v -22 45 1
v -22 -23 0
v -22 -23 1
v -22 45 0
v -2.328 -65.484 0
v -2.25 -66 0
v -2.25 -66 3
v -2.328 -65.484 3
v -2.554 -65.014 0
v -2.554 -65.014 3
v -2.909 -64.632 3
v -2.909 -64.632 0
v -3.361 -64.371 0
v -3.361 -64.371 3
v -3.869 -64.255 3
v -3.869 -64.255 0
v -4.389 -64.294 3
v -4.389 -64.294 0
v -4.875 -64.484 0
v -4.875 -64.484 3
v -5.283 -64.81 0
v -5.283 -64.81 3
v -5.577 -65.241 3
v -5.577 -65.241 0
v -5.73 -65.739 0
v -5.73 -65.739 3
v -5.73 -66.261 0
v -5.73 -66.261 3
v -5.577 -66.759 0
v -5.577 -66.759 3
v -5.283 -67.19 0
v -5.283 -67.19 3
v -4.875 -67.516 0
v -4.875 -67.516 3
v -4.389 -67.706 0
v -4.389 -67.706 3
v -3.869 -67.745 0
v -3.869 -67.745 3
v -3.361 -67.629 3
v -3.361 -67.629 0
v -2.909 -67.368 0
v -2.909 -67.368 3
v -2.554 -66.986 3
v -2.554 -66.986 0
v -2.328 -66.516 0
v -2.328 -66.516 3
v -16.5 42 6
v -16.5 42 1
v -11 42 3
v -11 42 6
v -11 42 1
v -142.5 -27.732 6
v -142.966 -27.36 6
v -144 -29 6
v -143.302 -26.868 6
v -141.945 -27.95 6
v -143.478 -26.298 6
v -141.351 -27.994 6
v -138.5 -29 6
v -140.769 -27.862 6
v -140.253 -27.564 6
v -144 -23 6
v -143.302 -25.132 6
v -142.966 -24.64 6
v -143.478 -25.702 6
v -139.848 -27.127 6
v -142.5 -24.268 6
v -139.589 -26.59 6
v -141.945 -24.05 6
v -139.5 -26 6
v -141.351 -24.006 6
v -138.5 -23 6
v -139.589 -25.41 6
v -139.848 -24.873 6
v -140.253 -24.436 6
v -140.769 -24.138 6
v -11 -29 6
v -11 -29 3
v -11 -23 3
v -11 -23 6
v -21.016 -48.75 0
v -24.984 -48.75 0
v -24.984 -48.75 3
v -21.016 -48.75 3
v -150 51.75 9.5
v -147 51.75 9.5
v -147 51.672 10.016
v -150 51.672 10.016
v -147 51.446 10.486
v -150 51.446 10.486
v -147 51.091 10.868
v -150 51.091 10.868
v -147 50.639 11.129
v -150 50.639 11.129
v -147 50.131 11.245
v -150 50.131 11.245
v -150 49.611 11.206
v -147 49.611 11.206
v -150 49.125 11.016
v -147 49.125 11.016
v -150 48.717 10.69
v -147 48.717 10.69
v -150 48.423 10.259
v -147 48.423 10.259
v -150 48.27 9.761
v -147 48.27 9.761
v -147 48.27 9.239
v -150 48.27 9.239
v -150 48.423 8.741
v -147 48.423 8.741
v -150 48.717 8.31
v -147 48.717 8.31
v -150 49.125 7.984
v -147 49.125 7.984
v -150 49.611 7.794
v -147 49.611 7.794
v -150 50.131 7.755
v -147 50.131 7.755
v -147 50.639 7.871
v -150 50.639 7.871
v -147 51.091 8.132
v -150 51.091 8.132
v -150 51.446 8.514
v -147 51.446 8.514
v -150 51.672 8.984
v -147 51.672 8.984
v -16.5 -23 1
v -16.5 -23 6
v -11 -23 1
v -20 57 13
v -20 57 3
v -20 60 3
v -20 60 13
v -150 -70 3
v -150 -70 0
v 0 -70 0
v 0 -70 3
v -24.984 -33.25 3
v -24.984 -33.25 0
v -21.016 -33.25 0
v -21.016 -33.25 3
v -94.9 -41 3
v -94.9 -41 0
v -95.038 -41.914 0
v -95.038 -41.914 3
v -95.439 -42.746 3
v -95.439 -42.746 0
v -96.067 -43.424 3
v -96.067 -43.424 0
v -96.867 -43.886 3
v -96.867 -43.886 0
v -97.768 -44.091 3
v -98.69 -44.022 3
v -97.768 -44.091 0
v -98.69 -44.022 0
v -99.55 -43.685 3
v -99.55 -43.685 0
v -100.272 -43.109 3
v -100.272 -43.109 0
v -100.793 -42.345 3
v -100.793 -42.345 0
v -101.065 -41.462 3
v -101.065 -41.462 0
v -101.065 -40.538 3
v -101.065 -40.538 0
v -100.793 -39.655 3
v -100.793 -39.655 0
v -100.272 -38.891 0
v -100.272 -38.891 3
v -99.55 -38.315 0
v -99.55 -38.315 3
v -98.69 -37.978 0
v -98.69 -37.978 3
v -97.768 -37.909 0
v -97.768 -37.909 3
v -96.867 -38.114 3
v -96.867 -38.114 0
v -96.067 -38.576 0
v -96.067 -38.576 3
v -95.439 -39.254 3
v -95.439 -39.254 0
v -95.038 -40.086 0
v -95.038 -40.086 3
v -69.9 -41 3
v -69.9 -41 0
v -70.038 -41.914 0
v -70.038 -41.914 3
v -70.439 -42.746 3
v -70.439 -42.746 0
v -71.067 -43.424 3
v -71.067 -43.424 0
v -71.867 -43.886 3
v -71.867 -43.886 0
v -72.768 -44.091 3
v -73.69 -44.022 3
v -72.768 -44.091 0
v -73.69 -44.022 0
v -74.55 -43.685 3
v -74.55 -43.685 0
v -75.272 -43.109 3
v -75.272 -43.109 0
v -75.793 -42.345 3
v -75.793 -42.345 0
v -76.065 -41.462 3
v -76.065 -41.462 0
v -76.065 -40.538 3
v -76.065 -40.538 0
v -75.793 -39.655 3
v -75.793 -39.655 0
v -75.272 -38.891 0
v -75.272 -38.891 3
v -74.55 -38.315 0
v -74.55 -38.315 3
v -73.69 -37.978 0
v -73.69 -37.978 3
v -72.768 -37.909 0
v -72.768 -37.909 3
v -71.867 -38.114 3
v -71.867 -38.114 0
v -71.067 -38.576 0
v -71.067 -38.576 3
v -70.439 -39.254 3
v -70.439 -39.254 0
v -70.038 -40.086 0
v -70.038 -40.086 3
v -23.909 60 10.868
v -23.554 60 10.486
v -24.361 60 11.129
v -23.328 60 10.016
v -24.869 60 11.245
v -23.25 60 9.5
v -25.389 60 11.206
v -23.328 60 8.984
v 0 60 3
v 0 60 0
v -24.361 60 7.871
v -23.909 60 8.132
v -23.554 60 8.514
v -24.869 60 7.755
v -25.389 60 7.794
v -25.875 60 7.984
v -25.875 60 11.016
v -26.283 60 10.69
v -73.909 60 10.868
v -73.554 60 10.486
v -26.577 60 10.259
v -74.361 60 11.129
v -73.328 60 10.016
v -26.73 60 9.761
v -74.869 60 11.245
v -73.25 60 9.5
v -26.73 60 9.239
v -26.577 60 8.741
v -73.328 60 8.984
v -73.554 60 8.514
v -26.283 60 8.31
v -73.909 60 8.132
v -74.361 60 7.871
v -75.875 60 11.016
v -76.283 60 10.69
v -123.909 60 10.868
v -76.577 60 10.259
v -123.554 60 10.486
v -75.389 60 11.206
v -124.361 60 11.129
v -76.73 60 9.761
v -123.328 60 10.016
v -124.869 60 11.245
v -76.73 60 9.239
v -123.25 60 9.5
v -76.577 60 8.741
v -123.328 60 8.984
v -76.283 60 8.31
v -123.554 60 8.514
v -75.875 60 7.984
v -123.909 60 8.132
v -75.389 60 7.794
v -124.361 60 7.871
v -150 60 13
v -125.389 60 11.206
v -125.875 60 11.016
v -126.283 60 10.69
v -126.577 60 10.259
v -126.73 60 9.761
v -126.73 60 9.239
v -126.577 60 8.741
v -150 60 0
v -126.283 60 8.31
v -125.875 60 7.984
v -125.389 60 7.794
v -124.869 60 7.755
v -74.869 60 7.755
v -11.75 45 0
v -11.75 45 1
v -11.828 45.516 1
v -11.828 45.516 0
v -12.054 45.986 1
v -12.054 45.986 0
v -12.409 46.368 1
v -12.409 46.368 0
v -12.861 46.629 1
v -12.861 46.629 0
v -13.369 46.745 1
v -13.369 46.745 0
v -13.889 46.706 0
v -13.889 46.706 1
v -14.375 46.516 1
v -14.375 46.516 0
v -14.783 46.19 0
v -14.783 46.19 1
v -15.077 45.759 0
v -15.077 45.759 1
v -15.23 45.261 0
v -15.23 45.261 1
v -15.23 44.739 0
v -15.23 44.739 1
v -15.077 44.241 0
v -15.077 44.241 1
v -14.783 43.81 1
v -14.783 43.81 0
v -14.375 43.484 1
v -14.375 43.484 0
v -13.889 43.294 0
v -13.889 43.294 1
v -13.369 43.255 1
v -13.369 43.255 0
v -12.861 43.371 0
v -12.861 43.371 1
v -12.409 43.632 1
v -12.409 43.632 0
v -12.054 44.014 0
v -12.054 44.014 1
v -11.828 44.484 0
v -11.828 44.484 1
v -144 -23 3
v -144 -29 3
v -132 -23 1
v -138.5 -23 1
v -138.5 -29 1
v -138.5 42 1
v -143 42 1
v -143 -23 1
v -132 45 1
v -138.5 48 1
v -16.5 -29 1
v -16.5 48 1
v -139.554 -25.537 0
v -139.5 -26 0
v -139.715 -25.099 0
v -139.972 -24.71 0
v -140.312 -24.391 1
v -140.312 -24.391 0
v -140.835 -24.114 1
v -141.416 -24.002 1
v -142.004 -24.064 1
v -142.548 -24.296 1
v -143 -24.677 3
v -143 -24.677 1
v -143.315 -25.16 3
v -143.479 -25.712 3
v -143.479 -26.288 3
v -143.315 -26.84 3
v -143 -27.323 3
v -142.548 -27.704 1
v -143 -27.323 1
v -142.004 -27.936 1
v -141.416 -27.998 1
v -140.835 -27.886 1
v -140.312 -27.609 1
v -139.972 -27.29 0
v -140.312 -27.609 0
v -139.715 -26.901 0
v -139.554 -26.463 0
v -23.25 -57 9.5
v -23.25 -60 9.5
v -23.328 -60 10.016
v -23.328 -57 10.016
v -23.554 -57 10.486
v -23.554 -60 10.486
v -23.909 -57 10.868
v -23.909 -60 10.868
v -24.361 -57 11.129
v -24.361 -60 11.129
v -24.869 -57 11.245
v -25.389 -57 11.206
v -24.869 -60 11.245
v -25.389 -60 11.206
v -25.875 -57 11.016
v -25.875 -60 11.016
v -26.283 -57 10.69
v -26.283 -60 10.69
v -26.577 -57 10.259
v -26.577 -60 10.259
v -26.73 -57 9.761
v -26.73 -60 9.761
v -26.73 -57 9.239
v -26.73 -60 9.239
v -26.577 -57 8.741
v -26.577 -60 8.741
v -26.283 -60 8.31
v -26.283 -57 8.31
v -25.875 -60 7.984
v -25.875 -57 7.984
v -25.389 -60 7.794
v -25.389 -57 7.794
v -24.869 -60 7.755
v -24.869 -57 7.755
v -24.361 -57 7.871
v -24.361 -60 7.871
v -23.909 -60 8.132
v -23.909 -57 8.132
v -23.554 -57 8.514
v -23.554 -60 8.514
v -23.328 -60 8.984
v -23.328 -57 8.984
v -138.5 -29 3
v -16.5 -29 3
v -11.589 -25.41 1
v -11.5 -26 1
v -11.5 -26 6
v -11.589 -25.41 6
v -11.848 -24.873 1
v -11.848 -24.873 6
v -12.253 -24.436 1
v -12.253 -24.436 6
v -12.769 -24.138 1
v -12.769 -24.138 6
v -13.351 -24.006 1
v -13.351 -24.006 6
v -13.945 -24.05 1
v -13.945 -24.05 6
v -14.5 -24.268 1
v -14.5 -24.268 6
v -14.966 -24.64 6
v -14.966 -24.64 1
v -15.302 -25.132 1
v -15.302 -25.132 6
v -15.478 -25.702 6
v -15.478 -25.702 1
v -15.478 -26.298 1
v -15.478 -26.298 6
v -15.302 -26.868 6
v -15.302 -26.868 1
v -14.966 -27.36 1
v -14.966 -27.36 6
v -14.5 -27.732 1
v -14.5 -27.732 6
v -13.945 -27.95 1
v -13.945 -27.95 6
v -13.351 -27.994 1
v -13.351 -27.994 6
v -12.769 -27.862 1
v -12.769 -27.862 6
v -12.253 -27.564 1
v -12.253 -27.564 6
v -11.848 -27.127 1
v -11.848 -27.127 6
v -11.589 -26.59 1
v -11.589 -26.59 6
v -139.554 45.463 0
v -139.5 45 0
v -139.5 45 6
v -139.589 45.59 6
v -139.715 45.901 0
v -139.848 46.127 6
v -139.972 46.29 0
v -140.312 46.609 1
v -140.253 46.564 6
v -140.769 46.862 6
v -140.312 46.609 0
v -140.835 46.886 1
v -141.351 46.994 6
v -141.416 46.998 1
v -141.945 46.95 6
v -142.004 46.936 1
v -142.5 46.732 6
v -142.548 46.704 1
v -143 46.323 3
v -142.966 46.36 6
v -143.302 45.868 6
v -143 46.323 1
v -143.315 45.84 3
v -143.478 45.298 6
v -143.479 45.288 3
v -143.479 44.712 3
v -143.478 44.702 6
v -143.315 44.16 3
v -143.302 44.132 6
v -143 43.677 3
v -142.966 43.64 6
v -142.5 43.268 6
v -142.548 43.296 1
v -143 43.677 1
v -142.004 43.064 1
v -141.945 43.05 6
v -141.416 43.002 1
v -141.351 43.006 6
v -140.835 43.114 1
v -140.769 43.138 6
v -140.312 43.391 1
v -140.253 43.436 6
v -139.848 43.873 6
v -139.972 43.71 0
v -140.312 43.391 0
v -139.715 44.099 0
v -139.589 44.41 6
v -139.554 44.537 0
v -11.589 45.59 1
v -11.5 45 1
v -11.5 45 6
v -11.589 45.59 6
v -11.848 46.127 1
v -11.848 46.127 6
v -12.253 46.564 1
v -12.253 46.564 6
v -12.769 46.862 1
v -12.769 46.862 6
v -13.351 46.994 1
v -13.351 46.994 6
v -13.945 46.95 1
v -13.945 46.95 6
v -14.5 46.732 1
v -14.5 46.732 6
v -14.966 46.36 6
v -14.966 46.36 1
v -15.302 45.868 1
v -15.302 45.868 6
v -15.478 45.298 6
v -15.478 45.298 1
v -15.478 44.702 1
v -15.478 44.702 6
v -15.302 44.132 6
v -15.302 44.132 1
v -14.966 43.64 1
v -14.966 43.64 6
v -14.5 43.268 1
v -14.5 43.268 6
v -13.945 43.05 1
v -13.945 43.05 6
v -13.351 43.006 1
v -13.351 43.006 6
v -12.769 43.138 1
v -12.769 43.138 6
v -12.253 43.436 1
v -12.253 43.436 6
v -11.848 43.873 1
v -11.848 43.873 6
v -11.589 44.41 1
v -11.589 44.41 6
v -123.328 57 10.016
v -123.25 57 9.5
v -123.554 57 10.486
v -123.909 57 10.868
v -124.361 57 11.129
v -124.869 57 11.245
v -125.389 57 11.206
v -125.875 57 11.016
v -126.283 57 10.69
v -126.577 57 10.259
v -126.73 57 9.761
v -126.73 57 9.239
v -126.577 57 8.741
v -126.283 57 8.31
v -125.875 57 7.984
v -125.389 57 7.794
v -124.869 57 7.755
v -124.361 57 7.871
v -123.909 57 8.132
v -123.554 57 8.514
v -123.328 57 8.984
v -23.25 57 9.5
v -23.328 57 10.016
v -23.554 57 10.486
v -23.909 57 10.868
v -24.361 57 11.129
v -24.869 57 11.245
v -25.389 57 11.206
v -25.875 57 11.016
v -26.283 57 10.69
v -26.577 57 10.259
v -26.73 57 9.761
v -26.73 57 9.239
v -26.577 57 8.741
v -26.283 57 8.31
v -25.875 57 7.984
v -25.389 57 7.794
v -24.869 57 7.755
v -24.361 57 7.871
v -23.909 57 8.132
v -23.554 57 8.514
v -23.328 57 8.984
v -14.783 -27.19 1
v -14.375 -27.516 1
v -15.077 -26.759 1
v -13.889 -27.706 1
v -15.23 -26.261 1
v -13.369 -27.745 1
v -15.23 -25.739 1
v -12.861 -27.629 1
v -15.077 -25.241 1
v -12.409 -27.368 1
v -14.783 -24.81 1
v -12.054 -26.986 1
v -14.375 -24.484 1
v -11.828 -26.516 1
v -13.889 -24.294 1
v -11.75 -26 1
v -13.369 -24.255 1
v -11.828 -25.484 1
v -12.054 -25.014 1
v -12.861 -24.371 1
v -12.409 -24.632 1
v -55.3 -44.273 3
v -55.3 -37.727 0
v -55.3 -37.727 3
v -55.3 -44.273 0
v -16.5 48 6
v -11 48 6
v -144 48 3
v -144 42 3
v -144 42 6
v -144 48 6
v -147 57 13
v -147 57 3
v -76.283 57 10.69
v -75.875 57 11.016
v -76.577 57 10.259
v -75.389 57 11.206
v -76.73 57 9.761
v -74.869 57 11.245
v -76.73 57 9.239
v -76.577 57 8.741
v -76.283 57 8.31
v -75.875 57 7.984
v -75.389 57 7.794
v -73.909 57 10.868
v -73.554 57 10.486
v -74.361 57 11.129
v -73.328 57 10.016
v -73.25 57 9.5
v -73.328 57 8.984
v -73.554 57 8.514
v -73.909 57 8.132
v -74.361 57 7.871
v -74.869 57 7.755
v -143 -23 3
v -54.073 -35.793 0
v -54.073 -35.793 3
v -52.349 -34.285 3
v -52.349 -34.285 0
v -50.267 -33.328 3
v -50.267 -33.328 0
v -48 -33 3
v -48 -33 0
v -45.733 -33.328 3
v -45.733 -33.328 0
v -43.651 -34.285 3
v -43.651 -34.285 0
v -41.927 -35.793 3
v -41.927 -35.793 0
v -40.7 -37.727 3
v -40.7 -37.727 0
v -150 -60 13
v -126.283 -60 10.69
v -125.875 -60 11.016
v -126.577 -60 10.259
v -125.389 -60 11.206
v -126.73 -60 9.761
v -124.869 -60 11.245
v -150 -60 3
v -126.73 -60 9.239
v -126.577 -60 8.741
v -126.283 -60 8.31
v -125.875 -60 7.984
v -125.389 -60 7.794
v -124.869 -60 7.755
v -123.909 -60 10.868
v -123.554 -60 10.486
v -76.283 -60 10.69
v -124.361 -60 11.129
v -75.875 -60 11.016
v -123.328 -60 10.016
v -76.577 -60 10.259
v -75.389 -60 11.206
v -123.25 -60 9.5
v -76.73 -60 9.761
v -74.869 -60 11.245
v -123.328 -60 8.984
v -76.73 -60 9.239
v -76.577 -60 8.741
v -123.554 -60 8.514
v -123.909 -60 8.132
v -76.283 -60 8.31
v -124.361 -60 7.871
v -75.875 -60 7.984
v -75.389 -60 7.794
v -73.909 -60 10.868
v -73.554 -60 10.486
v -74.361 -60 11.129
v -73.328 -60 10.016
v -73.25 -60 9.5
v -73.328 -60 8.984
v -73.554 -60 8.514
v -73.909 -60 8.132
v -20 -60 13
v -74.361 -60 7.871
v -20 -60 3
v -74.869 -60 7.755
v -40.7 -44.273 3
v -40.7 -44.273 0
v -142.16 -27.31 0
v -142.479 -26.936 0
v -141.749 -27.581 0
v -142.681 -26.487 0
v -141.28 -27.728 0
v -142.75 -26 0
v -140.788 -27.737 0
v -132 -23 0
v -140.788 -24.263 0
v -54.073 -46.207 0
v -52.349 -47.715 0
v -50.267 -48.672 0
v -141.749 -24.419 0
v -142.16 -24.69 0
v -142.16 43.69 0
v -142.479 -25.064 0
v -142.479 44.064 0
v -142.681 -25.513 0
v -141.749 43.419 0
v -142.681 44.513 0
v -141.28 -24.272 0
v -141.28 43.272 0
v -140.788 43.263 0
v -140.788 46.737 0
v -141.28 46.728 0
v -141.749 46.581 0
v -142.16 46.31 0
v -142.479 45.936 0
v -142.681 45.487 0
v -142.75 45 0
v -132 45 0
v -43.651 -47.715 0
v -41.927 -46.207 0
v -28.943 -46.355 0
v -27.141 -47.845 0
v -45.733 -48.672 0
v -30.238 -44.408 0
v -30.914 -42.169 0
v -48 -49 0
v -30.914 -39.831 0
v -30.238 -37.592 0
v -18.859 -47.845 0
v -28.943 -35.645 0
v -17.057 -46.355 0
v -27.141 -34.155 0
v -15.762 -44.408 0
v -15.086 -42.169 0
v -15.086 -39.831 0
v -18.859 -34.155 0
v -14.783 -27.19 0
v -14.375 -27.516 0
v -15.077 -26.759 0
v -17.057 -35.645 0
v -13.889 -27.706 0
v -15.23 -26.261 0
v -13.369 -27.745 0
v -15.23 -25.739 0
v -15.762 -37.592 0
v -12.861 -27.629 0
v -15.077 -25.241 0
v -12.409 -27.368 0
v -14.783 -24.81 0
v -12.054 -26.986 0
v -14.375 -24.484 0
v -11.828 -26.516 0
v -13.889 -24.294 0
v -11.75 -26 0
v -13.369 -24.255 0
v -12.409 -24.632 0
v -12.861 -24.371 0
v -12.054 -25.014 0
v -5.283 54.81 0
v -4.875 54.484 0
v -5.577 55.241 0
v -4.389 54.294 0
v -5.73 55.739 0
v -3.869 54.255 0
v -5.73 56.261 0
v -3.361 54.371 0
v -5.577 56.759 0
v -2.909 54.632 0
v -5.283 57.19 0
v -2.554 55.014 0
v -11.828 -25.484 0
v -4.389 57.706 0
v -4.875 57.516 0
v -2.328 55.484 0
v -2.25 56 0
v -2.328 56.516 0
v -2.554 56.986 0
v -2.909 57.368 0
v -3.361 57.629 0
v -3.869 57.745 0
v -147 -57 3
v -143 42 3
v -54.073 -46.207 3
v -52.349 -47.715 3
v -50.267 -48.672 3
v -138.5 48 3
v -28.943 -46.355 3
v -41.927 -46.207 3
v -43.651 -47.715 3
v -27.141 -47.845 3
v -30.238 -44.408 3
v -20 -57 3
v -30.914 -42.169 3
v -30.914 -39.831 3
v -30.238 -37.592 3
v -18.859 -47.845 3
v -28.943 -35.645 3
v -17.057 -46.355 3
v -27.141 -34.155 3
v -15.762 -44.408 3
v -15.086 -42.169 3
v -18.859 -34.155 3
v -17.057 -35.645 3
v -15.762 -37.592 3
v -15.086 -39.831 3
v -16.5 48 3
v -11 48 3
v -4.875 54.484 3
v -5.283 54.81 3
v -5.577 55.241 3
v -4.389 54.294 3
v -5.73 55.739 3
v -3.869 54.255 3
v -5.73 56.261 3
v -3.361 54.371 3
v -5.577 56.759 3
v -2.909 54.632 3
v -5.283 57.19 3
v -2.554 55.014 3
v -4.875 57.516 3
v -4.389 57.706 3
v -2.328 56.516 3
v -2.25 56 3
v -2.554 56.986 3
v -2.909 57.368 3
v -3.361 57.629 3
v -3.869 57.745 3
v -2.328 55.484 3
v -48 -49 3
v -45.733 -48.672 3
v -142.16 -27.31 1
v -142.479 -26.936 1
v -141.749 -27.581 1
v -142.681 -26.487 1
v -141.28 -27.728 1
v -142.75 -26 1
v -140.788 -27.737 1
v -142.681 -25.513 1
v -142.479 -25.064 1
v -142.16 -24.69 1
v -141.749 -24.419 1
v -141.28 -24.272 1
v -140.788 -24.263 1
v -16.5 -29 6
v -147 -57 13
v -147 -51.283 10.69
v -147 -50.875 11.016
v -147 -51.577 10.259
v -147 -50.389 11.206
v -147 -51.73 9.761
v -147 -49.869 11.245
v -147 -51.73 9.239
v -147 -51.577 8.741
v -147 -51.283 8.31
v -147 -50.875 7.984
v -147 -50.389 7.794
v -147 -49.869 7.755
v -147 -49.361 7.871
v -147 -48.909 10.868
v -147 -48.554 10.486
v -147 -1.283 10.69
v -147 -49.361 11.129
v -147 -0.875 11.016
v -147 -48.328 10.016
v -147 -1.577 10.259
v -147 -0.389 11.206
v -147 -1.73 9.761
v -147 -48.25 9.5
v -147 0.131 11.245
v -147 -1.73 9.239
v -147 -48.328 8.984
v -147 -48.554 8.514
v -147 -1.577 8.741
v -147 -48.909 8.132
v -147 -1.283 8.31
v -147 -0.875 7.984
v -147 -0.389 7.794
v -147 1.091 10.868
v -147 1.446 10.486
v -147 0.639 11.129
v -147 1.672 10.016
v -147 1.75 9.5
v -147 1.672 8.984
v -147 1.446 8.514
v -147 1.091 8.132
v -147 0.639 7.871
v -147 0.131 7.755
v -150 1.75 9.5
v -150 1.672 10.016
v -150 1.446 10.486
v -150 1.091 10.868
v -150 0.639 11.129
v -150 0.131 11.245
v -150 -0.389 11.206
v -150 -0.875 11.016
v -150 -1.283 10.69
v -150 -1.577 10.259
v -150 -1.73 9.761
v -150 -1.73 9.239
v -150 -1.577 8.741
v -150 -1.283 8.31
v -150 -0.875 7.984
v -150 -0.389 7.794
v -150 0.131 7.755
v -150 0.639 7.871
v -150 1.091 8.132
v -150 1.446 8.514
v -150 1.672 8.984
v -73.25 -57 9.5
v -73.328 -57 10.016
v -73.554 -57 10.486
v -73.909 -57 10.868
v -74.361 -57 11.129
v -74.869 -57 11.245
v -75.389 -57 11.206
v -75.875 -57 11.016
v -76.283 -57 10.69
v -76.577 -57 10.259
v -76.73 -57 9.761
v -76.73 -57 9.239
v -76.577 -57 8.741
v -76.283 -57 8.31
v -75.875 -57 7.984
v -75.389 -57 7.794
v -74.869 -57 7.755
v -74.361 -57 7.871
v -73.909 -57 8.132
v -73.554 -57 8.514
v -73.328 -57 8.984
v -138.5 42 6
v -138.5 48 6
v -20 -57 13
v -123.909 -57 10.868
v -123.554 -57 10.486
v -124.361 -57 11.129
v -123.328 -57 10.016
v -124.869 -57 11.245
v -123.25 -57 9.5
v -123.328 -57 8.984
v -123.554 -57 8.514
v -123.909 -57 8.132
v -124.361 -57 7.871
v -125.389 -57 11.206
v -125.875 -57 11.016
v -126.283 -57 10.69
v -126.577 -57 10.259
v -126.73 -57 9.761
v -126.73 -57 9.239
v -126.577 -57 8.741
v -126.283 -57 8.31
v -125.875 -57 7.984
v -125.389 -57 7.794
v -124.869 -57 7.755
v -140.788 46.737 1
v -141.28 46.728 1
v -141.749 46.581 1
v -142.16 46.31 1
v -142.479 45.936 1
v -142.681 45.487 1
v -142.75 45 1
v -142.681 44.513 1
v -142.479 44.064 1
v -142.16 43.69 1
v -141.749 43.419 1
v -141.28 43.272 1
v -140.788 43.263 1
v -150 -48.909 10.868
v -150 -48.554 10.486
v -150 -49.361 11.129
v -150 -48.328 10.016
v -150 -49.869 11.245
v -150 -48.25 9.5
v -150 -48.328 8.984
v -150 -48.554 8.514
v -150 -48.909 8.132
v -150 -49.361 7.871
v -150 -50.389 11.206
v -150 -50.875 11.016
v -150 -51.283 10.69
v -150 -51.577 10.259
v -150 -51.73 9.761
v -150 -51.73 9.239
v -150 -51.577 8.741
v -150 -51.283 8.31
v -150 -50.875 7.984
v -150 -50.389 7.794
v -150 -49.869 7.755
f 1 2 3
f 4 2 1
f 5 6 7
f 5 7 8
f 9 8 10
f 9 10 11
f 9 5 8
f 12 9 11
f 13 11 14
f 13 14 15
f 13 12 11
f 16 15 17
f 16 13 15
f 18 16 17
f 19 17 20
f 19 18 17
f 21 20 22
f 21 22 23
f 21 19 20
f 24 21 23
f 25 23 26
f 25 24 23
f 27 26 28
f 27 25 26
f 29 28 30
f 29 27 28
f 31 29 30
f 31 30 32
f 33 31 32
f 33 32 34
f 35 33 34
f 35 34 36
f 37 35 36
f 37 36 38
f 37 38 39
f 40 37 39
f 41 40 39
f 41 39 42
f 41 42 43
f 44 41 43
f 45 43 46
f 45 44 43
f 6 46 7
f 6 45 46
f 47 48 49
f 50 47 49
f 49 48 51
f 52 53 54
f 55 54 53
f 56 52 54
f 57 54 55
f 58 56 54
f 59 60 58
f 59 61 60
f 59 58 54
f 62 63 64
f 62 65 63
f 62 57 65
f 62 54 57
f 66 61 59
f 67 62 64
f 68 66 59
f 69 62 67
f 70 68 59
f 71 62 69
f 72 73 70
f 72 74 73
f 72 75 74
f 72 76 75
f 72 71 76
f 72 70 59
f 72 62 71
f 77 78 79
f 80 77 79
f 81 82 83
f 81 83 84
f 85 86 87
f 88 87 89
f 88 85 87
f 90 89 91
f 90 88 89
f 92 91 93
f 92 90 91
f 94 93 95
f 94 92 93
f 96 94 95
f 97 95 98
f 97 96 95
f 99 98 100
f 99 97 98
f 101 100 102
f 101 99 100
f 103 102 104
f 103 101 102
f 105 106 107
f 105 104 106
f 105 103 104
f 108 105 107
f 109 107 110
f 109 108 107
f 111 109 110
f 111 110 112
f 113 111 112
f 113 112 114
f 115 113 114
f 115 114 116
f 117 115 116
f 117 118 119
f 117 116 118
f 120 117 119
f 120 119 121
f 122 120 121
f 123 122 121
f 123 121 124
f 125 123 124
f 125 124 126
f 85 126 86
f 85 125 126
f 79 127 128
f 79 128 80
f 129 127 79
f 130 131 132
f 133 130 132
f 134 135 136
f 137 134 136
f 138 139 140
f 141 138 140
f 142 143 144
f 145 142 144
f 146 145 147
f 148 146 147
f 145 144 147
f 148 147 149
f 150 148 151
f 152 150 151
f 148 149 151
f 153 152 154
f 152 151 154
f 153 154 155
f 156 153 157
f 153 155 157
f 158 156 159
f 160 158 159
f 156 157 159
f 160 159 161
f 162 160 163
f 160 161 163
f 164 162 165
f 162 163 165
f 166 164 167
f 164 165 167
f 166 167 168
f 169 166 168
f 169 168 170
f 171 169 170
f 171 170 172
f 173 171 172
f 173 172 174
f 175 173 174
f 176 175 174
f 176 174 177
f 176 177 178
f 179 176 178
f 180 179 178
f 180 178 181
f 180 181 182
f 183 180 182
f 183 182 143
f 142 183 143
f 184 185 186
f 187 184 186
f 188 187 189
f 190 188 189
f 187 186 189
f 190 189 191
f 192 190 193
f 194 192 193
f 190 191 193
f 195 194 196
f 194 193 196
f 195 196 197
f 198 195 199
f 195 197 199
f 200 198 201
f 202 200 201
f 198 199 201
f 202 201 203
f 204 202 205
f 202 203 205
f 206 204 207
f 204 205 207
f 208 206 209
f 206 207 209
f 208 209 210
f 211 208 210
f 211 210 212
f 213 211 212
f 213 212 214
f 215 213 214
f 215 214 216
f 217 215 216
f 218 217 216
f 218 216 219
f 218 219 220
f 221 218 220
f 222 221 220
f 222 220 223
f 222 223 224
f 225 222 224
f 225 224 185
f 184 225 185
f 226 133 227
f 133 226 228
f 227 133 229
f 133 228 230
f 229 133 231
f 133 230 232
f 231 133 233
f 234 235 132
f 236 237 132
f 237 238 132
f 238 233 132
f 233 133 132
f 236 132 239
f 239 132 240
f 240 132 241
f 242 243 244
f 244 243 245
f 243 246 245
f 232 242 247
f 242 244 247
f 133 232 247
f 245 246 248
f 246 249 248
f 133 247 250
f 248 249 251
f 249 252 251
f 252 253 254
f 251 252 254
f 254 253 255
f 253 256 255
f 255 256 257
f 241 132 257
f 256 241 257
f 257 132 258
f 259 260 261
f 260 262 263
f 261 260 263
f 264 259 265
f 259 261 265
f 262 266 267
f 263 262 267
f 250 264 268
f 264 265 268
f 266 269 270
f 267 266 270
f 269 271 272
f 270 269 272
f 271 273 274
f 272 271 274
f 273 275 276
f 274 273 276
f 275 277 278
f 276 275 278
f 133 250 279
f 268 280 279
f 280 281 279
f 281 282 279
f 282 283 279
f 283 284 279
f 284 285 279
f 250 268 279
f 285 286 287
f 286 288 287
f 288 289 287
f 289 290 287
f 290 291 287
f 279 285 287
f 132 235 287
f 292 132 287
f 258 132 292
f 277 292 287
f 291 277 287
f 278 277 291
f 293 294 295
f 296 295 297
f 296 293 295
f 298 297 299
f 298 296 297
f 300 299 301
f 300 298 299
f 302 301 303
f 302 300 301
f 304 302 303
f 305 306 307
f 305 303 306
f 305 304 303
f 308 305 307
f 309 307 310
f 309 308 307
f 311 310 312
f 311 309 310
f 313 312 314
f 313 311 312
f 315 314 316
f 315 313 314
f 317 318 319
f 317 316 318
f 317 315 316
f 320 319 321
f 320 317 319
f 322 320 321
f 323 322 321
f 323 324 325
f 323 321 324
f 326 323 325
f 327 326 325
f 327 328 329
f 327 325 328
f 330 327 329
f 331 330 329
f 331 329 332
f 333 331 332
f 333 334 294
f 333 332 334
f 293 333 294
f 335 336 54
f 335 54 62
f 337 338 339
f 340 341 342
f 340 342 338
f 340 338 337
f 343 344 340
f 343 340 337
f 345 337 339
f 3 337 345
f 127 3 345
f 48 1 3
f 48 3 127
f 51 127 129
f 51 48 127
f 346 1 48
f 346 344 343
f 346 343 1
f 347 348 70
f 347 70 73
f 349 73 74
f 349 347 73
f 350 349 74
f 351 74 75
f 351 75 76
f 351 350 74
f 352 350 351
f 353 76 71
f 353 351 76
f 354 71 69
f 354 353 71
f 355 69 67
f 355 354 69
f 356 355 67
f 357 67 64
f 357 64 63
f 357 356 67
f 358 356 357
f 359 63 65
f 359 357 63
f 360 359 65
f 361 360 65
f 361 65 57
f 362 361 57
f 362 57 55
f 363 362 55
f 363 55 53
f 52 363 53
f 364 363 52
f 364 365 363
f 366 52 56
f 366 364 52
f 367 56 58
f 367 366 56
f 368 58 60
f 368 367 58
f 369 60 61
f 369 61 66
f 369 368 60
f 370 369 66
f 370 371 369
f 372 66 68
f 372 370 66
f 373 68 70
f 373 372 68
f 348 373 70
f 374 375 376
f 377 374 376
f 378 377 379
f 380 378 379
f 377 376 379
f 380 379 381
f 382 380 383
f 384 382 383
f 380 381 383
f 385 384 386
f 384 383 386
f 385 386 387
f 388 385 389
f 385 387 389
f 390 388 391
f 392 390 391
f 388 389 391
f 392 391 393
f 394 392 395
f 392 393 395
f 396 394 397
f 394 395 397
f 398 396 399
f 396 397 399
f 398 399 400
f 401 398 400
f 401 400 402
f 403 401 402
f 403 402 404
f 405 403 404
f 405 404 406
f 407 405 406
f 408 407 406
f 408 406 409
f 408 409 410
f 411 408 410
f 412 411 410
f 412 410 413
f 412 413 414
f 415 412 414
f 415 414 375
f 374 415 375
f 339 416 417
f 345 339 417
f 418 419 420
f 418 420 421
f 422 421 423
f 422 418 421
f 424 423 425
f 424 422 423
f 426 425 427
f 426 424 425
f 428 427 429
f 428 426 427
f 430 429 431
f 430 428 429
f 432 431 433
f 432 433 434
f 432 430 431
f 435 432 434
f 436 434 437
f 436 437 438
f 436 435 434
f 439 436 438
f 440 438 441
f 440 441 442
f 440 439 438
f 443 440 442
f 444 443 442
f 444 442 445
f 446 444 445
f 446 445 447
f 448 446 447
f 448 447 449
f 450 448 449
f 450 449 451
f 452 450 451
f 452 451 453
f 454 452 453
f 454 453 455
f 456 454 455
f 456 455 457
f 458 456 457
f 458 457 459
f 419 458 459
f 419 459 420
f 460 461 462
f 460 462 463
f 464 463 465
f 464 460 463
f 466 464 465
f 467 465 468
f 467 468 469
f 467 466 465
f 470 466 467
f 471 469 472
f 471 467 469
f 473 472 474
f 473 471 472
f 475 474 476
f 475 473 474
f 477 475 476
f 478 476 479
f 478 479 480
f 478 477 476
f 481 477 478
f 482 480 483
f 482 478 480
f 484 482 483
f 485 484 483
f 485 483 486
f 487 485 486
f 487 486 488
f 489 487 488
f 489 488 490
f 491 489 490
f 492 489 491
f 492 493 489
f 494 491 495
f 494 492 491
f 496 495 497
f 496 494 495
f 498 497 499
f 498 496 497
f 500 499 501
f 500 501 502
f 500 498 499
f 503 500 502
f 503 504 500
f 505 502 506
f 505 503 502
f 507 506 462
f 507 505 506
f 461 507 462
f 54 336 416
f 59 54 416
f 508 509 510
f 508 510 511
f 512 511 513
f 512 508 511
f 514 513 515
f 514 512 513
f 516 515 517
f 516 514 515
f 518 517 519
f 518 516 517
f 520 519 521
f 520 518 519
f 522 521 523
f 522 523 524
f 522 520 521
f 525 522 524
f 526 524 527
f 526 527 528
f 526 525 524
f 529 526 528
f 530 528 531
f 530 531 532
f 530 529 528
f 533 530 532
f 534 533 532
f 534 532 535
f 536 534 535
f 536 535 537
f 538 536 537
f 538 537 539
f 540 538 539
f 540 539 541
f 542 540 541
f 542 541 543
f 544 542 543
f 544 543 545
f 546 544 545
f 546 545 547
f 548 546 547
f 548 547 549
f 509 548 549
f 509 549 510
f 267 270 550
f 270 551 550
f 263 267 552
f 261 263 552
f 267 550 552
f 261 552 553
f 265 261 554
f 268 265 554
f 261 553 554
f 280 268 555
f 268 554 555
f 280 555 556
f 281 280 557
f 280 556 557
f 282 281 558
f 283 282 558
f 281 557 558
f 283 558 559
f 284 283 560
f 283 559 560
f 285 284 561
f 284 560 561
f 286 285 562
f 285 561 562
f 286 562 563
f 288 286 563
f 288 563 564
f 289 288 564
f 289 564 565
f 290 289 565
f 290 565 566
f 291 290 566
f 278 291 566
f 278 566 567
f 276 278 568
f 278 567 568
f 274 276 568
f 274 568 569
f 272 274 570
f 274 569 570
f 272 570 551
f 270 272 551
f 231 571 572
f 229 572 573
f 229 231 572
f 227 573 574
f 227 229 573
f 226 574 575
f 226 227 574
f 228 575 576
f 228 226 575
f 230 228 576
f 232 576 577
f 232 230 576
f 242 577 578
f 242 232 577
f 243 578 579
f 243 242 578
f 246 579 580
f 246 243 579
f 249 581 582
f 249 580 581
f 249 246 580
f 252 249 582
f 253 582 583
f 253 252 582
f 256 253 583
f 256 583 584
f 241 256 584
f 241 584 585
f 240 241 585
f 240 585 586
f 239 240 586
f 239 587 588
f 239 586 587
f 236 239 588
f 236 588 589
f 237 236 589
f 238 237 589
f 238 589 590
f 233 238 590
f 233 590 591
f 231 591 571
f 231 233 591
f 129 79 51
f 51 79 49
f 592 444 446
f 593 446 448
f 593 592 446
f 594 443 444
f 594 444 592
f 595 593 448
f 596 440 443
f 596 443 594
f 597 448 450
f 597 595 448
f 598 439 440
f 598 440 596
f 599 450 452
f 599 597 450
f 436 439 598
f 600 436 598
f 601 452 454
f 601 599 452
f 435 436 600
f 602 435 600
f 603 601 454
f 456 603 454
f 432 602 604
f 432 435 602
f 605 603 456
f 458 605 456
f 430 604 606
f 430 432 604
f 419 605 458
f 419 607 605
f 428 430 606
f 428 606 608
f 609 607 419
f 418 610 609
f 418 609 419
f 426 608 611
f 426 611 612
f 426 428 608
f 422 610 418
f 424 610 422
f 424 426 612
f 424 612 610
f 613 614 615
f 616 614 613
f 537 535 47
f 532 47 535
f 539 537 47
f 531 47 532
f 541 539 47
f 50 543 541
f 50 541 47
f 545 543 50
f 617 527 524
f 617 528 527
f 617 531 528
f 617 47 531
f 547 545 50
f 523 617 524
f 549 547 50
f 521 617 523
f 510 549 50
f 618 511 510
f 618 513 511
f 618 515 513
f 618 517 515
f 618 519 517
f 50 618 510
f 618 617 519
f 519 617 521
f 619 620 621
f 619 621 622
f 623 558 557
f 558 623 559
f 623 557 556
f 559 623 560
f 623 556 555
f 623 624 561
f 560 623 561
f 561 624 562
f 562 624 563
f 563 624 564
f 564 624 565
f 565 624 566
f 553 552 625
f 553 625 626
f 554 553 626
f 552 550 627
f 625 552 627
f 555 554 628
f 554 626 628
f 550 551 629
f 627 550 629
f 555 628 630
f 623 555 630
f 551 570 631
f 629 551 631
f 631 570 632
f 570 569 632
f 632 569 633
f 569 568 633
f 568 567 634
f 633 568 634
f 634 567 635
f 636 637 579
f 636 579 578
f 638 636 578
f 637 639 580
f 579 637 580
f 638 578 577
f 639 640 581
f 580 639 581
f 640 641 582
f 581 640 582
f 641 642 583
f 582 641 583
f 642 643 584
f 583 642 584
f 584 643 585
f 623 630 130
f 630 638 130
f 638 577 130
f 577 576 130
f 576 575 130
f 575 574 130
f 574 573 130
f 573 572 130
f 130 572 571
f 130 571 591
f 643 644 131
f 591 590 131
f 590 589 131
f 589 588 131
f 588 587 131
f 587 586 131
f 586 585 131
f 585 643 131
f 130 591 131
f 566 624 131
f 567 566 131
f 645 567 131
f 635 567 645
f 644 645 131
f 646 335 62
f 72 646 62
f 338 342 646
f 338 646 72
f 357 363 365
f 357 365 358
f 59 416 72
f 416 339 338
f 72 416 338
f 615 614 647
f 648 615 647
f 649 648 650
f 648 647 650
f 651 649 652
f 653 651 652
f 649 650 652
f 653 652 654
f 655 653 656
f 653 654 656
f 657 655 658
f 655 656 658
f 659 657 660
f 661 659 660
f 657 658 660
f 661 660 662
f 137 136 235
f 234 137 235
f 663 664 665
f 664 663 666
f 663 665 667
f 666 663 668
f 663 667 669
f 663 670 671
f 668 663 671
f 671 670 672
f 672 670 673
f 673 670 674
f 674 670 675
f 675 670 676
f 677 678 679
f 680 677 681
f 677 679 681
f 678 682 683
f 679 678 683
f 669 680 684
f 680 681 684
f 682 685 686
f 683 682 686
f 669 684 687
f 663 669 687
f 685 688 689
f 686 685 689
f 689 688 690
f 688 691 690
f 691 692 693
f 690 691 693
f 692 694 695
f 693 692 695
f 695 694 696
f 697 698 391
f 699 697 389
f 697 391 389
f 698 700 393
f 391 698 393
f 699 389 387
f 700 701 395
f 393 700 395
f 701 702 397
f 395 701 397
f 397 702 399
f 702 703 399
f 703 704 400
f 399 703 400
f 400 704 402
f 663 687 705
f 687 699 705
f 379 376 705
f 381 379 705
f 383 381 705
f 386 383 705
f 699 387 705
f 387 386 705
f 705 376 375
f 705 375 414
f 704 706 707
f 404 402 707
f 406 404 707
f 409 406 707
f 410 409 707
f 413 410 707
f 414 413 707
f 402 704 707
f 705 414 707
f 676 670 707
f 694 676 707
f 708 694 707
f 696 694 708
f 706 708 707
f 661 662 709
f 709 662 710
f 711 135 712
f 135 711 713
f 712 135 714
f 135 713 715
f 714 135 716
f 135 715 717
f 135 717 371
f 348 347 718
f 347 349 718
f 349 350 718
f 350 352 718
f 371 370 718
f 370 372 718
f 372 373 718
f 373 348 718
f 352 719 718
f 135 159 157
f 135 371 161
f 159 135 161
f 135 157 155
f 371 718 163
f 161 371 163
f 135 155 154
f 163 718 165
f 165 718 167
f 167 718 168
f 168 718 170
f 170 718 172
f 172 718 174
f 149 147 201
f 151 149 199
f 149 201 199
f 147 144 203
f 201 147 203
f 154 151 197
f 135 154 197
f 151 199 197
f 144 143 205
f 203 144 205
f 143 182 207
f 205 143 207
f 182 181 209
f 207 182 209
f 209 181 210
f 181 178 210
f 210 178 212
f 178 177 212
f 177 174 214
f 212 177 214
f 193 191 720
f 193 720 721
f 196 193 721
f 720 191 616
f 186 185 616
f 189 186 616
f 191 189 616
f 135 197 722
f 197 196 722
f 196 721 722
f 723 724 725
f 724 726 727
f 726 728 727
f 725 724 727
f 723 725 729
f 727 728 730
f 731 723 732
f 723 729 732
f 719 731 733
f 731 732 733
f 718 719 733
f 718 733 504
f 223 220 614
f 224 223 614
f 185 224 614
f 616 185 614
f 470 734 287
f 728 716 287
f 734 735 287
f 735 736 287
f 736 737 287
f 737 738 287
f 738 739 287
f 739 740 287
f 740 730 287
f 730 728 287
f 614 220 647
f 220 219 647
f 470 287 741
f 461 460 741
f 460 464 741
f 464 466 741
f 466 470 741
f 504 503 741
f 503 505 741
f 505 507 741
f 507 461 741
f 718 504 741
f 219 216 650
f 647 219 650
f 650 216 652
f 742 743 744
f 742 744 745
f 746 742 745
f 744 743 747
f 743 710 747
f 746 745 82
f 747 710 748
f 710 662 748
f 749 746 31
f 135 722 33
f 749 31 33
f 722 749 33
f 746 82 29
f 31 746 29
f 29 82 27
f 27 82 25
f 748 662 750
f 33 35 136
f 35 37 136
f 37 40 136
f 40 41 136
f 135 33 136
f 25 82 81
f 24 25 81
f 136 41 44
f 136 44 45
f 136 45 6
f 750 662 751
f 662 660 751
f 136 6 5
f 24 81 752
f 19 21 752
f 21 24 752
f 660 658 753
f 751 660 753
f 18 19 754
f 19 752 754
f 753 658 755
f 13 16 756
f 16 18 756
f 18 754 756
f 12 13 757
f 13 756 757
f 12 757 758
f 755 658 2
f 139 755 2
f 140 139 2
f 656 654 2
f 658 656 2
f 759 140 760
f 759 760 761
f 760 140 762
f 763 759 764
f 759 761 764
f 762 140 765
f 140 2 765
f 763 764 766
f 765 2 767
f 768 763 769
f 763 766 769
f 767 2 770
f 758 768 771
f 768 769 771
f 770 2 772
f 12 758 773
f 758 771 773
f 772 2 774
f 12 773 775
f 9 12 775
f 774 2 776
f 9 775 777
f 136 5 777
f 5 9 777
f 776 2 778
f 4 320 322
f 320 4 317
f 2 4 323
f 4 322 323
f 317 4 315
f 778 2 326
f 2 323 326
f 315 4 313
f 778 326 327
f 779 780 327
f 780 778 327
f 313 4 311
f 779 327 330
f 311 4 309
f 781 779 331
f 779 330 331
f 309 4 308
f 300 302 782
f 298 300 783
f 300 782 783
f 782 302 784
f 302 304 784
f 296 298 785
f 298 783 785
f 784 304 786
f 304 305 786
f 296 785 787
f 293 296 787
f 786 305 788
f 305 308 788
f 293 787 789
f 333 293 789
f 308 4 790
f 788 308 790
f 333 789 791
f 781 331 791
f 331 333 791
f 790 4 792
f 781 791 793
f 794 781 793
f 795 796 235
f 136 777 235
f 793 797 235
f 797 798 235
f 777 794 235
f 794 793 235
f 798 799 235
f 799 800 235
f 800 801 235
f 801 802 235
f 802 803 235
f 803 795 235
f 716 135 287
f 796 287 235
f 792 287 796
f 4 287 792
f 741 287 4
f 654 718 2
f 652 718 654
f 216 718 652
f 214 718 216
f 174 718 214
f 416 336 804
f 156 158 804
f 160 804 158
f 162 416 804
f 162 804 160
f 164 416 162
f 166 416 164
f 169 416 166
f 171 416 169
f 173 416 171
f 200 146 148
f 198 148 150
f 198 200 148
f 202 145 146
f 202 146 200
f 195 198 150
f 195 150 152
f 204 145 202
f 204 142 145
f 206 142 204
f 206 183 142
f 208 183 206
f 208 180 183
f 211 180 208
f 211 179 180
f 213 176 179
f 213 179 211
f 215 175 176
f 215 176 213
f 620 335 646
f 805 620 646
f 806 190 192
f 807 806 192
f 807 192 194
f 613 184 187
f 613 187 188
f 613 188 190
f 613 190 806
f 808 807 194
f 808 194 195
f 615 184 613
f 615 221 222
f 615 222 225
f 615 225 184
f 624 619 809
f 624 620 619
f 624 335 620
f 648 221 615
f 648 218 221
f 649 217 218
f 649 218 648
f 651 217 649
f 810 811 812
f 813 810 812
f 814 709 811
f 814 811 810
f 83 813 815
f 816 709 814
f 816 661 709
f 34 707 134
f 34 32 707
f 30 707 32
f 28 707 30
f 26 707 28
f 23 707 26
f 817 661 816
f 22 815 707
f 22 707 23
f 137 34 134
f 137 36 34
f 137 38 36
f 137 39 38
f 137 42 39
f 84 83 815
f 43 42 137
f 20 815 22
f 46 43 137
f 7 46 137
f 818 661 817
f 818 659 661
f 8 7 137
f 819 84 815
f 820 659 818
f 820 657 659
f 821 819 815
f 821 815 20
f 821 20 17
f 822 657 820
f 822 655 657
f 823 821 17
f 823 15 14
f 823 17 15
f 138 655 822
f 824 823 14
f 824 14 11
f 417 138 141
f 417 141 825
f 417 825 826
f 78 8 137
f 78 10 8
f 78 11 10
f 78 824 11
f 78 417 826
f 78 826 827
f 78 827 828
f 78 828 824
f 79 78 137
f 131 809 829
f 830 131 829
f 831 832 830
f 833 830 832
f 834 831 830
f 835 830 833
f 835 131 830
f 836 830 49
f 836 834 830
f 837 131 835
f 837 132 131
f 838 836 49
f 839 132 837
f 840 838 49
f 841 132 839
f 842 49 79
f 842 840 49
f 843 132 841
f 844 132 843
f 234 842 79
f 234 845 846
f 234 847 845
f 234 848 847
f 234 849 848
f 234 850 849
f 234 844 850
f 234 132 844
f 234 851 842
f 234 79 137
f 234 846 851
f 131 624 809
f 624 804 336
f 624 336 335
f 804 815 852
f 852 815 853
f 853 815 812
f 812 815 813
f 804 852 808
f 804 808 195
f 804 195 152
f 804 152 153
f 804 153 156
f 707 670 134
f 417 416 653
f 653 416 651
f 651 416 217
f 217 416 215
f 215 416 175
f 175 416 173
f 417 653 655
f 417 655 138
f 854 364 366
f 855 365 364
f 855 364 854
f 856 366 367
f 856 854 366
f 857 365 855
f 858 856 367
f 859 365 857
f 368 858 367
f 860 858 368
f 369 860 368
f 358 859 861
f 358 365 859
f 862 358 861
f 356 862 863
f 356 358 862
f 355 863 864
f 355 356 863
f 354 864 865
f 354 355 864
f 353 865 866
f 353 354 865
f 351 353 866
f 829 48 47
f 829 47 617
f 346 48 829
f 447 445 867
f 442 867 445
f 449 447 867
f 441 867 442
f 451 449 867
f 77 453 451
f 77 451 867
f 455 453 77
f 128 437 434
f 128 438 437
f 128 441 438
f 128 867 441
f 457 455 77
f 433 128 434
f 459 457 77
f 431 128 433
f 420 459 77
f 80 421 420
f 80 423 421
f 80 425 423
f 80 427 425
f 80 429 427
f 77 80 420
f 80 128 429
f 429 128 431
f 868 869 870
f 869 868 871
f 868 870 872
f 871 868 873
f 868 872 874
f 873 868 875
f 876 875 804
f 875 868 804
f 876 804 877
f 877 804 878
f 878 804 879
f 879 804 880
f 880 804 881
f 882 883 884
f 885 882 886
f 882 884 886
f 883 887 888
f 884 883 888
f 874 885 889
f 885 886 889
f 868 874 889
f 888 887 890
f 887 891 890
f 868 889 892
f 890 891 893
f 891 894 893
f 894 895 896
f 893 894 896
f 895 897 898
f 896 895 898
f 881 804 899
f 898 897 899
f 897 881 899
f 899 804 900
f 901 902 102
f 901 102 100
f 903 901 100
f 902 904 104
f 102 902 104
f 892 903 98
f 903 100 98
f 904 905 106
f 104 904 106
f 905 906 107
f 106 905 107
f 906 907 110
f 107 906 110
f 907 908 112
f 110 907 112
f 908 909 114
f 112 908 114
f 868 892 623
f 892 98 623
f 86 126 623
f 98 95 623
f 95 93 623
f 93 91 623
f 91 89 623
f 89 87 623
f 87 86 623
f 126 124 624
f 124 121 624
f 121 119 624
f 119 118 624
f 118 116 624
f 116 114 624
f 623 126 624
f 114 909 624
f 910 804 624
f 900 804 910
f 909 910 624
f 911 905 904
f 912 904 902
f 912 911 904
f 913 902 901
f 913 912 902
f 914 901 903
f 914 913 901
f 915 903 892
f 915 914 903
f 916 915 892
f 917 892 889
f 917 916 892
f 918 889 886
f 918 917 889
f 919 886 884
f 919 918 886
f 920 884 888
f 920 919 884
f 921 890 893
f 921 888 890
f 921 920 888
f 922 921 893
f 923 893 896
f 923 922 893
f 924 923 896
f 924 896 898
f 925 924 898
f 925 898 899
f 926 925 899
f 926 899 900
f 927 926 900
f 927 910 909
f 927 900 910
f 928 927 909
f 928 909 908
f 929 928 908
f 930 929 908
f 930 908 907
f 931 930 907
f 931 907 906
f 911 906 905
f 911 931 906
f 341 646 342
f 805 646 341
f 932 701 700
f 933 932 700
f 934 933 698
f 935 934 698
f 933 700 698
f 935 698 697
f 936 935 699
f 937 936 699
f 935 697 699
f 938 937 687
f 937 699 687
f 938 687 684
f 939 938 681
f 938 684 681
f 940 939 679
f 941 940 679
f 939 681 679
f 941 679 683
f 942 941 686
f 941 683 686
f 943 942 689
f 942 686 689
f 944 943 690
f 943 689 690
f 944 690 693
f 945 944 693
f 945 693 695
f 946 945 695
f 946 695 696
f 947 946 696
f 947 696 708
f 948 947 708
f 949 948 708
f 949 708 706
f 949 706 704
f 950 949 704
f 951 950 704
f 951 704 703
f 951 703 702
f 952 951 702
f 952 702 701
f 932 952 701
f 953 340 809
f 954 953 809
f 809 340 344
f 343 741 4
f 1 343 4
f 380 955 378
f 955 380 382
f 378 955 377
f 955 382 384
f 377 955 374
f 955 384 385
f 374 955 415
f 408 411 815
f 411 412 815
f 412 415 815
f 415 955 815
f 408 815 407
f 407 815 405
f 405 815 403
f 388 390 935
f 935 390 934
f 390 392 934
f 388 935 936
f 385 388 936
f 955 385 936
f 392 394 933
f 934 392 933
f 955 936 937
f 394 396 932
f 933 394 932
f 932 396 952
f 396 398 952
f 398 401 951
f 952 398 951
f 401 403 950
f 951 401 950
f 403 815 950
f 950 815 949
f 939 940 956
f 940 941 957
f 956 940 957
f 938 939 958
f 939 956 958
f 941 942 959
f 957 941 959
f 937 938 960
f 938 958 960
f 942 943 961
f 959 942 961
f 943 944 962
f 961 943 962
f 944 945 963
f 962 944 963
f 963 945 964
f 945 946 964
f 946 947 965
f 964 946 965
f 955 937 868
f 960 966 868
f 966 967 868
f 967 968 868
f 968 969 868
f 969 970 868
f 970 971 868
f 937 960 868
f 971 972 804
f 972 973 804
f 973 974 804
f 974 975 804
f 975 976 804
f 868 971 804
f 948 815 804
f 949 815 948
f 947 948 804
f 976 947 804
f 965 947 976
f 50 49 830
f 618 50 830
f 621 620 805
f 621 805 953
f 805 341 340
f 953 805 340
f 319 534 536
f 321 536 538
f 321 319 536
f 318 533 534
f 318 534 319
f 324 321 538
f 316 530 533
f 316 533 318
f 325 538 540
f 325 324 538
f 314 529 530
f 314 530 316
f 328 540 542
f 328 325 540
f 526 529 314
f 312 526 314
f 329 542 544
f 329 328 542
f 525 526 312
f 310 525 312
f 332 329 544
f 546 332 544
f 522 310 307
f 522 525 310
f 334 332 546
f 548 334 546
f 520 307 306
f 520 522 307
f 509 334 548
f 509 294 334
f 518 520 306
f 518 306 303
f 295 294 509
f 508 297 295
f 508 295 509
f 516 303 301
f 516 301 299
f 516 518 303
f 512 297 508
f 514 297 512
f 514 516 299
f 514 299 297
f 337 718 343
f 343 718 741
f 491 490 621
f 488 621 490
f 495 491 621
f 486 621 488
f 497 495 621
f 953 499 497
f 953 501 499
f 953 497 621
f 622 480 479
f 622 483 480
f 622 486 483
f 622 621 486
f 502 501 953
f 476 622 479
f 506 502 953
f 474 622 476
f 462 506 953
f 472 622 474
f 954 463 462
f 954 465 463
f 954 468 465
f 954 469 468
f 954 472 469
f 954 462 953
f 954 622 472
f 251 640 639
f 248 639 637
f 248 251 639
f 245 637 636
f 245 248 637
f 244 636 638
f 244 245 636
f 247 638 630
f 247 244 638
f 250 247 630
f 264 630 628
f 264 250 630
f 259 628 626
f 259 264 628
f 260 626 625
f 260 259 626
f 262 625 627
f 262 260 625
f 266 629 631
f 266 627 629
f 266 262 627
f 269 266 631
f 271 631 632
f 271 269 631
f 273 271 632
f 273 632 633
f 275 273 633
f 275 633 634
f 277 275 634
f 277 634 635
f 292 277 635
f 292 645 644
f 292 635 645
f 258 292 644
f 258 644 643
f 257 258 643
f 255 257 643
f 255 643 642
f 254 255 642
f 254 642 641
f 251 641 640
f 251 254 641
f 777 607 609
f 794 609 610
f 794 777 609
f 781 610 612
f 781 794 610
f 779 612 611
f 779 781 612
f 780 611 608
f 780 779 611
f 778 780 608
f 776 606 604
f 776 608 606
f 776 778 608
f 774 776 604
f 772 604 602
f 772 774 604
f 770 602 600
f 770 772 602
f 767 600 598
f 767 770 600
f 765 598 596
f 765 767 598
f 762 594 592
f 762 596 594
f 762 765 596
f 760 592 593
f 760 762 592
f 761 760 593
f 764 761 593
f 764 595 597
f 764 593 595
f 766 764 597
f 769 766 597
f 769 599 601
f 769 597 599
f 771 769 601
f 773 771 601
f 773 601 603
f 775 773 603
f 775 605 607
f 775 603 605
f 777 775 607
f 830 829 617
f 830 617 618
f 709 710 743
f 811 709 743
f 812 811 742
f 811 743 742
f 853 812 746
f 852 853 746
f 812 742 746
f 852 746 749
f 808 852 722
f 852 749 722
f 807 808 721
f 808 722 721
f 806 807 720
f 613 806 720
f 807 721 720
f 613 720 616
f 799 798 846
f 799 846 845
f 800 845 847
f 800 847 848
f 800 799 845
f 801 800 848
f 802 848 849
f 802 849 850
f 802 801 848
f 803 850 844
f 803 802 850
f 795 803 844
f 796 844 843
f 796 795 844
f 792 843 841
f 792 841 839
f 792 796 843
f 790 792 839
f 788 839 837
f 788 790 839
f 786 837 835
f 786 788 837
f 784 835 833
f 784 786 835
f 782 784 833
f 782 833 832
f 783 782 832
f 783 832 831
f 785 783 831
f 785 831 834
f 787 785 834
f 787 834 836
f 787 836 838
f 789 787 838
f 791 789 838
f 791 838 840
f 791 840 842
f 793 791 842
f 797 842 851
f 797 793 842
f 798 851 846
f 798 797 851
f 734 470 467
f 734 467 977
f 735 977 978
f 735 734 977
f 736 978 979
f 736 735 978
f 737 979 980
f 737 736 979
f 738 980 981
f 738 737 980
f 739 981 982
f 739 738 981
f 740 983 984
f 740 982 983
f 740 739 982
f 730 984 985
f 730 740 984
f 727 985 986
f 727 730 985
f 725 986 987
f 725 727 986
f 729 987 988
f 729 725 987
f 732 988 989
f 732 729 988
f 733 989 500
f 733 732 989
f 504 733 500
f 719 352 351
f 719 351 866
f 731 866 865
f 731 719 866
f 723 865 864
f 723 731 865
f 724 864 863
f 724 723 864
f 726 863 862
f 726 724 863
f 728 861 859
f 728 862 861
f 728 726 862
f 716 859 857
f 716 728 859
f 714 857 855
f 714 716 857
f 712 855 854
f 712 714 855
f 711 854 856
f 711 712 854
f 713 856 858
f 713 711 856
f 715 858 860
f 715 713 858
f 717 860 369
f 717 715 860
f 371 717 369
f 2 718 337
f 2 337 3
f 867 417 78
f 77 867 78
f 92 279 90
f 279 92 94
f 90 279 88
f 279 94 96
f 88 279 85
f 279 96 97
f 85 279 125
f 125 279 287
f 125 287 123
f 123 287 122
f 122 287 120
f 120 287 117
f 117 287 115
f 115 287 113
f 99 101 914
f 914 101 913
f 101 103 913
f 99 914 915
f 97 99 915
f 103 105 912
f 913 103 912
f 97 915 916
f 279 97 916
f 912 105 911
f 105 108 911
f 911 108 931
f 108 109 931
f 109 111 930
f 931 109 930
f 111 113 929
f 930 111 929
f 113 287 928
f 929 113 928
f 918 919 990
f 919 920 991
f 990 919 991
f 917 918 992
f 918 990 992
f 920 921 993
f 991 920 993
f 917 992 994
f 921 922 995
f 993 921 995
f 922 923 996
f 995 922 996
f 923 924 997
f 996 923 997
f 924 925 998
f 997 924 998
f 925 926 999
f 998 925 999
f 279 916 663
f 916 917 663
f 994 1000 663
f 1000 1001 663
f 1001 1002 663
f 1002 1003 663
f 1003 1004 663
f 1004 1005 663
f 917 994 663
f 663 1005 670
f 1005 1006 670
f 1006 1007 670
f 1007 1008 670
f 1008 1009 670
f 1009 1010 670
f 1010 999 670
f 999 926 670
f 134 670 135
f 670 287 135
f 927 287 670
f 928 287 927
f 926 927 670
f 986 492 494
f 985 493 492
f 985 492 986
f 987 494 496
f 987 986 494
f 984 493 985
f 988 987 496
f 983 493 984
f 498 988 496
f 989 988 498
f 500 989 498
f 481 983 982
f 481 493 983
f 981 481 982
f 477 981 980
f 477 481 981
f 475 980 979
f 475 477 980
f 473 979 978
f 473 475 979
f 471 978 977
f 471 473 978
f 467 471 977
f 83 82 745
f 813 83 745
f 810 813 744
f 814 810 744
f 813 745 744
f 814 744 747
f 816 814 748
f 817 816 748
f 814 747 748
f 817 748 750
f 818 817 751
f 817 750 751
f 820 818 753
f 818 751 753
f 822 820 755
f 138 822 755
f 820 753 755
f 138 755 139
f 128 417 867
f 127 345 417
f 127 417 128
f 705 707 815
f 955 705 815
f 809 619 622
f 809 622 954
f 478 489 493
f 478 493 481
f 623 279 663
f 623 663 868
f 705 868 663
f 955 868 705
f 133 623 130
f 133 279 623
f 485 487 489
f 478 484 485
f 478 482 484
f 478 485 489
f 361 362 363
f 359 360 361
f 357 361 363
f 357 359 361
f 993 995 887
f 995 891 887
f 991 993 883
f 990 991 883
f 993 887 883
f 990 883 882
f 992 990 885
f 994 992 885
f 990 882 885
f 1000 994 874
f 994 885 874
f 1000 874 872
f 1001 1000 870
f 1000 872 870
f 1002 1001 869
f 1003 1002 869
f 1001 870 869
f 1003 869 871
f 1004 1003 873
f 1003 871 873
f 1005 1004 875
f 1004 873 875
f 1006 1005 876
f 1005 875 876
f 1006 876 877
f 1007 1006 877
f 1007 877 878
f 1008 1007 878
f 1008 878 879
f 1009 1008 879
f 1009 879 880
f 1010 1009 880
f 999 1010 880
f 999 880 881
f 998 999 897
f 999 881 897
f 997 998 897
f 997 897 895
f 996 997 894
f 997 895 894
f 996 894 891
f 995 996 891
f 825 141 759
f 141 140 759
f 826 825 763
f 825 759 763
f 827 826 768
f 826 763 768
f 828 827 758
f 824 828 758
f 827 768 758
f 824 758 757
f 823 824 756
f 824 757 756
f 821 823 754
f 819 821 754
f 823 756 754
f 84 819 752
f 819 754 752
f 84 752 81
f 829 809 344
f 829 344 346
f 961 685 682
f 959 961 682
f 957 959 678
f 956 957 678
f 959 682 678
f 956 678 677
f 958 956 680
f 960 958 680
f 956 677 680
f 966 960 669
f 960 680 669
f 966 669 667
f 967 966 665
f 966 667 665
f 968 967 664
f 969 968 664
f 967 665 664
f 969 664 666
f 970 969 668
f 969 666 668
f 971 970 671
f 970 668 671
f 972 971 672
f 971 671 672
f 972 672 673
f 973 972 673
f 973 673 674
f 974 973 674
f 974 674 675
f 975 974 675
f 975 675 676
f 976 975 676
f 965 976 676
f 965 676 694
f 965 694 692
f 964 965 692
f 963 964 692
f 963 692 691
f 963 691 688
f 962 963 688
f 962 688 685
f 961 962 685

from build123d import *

# Parameters (mm, degrees)
SKETCH_W        = 150
SKETCH_H        = 130
SKETCH_R        = 1.75
SKETCH_W_2      = 110
SKETCH_H_2      = 68
PAD_DEPTH       = 3
SKETCH002_W     = 132
SKETCH002_H     = 77
POCKET001_DEPTH = 2.5
SKETCH007_W     = 5.5
SKETCH007_H     = 6
SKETCH007_R     = 2
PAD002_DEPTH    = 6
PAD003_DEPTH    = 10
SKETCH010_R     = 1.75
POCKET002_DEPTH = 6
SKETCH011_R     = 1.75
POCKET003_DEPTH = 7.5
SKETCH012_R     = 1.75
POCKET004_DEPTH = 7.5
SKETCH015_R     = 8
SKETCH015_R_2   = 3.1
POCKET_DEPTH    = 13.001
SKETCH016_W     = 3.968626
SKETCH016_H     = 0.25
SKETCH016_W_2   = 0.7
SKETCH016_H_2   = 6.545228
PAD004_DEPTH    = 3


with BuildPart() as part:
    # Sketch → Pad (new body)
    with BuildSketch(Plane.XY):
        with Locations((-75, -5)):
            Rectangle(SKETCH_W, SKETCH_H)
        with Locations((-141, 45)):
            Circle(SKETCH_R, mode=Mode.SUBTRACT)
        with Locations((-141, -26)):
            Circle(SKETCH_R, mode=Mode.SUBTRACT)
        with Locations((-13.5, 45)):
            Circle(SKETCH_R, mode=Mode.SUBTRACT)
        with Locations((-13.5, -26)):
            Circle(SKETCH_R, mode=Mode.SUBTRACT)
        with Locations((-4, 56)):
            Circle(SKETCH_R, mode=Mode.SUBTRACT)
        with Locations((-4, -66)):
            Circle(SKETCH_R, mode=Mode.SUBTRACT)
        with Locations((-77, 11)):
            Rectangle(SKETCH_W_2, SKETCH_H_2, mode=Mode.SUBTRACT)
    extrude(amount=PAD_DEPTH)

    # Sketch002 → Pocket001 (cut)
    with BuildSketch(Plane.XY.offset(3.5)):
        with Locations((-77, 9.5)):
            Rectangle(SKETCH002_W, SKETCH002_H)
    extrude(amount=-POCKET001_DEPTH, mode=Mode.SUBTRACT)

    # Sketch007 → Pad002 (join)
    with BuildSketch(Plane.XY):
        with Locations((-141.25, 45)):
            Rectangle(SKETCH007_W, SKETCH007_H)
        with Locations((-141.5, 45)):
            Circle(SKETCH007_R, mode=Mode.SUBTRACT)
        with Locations((-13.75, 45)):
            Rectangle(SKETCH007_W, SKETCH007_H)
        with Locations((-13.5, 45)):
            Circle(SKETCH007_R, mode=Mode.SUBTRACT)
        with Locations((-13.75, -26)):
            Rectangle(SKETCH007_W, SKETCH007_H)
        with Locations((-13.5, -26)):
            Circle(SKETCH007_R, mode=Mode.SUBTRACT)
        with Locations((-141.25, -26)):
            Rectangle(SKETCH007_W, SKETCH007_H)
        with Locations((-141.5, -26)):
            Circle(SKETCH007_R, mode=Mode.SUBTRACT)
    extrude(amount=PAD002_DEPTH)

    # Sketch003 (on DatumPlane) → Pad003 (join)
    with BuildSketch(Plane.XY.offset(3)):
        Polygon((-20, 60), (-150, 60), (-150, -60), (-20, -60), (-20, -57), (-147, -57), (-147, 57), (-20, 57), align=None)
    extrude(amount=PAD003_DEPTH)

    # Sketch010 → Pocket002 (cut)
    with BuildSketch(Plane.XZ.offset(60)):
        with Locations((-125, 9.5)):
            Circle(SKETCH010_R)
        with Locations((-25, 9.5)):
            Circle(SKETCH010_R)
        with Locations((-75, 9.5)):
            Circle(SKETCH010_R)
    extrude(amount=-POCKET002_DEPTH, mode=Mode.SUBTRACT)

    # Sketch011 → Pocket003 (cut, symmetric)
    with BuildSketch(Plane.XZ.offset(-60)):
        with Locations((-75, 9.5)):
            Circle(SKETCH011_R)
        with Locations((-25, 9.5)):
            Circle(SKETCH011_R)
        with Locations((-125, 9.5)):
            Circle(SKETCH011_R)
    extrude(amount=POCKET003_DEPTH, both=True, mode=Mode.SUBTRACT)

    # Sketch012 (on DatumPlane) → Pocket004 (cut, symmetric)
    with BuildSketch(Plane.YZ.offset(-150)):
        with Locations((0, 9.5)):
            Circle(SKETCH012_R)
        with Locations((50, 9.5)):
            Circle(SKETCH012_R)
        with Locations((-50, 9.5)):
            Circle(SKETCH012_R)
    extrude(amount=POCKET004_DEPTH, both=True, mode=Mode.SUBTRACT)

    # Sketch015 → Pocket (cut, through all)
    with BuildSketch(Plane(origin=(0, 0, 0), x_dir=(1, 0, 0), z_dir=(0, 0, -1))):
        with Locations((-48, 41)):
            Circle(SKETCH015_R)
        with Locations((-73, 41)):
            Circle(SKETCH015_R_2)
        with Locations((-98, 41)):
            Circle(SKETCH015_R_2)
        with Locations((-23, 41)):
            Circle(SKETCH015_R)
    extrude(amount=-POCKET_DEPTH, mode=Mode.SUBTRACT)

    # Sketch016 (on Face4 of Pocket) → Pad004 (join)
    with BuildSketch(Plane(origin=(0, 0, 0), x_dir=(1, 0, 0), z_dir=(0, 0, -1))):
        with Locations((-23, 48.875)):
            Rectangle(SKETCH016_W, SKETCH016_H)
        with Locations((-23, 33.125)):
            Rectangle(SKETCH016_W, SKETCH016_H)
        with Locations((-55.65, 41)):
            Rectangle(SKETCH016_W_2, SKETCH016_H_2)
        with Locations((-40.35, 41)):
            Rectangle(SKETCH016_W_2, SKETCH016_H_2)
    extrude(amount=-PAD004_DEPTH)


solid = part.part
